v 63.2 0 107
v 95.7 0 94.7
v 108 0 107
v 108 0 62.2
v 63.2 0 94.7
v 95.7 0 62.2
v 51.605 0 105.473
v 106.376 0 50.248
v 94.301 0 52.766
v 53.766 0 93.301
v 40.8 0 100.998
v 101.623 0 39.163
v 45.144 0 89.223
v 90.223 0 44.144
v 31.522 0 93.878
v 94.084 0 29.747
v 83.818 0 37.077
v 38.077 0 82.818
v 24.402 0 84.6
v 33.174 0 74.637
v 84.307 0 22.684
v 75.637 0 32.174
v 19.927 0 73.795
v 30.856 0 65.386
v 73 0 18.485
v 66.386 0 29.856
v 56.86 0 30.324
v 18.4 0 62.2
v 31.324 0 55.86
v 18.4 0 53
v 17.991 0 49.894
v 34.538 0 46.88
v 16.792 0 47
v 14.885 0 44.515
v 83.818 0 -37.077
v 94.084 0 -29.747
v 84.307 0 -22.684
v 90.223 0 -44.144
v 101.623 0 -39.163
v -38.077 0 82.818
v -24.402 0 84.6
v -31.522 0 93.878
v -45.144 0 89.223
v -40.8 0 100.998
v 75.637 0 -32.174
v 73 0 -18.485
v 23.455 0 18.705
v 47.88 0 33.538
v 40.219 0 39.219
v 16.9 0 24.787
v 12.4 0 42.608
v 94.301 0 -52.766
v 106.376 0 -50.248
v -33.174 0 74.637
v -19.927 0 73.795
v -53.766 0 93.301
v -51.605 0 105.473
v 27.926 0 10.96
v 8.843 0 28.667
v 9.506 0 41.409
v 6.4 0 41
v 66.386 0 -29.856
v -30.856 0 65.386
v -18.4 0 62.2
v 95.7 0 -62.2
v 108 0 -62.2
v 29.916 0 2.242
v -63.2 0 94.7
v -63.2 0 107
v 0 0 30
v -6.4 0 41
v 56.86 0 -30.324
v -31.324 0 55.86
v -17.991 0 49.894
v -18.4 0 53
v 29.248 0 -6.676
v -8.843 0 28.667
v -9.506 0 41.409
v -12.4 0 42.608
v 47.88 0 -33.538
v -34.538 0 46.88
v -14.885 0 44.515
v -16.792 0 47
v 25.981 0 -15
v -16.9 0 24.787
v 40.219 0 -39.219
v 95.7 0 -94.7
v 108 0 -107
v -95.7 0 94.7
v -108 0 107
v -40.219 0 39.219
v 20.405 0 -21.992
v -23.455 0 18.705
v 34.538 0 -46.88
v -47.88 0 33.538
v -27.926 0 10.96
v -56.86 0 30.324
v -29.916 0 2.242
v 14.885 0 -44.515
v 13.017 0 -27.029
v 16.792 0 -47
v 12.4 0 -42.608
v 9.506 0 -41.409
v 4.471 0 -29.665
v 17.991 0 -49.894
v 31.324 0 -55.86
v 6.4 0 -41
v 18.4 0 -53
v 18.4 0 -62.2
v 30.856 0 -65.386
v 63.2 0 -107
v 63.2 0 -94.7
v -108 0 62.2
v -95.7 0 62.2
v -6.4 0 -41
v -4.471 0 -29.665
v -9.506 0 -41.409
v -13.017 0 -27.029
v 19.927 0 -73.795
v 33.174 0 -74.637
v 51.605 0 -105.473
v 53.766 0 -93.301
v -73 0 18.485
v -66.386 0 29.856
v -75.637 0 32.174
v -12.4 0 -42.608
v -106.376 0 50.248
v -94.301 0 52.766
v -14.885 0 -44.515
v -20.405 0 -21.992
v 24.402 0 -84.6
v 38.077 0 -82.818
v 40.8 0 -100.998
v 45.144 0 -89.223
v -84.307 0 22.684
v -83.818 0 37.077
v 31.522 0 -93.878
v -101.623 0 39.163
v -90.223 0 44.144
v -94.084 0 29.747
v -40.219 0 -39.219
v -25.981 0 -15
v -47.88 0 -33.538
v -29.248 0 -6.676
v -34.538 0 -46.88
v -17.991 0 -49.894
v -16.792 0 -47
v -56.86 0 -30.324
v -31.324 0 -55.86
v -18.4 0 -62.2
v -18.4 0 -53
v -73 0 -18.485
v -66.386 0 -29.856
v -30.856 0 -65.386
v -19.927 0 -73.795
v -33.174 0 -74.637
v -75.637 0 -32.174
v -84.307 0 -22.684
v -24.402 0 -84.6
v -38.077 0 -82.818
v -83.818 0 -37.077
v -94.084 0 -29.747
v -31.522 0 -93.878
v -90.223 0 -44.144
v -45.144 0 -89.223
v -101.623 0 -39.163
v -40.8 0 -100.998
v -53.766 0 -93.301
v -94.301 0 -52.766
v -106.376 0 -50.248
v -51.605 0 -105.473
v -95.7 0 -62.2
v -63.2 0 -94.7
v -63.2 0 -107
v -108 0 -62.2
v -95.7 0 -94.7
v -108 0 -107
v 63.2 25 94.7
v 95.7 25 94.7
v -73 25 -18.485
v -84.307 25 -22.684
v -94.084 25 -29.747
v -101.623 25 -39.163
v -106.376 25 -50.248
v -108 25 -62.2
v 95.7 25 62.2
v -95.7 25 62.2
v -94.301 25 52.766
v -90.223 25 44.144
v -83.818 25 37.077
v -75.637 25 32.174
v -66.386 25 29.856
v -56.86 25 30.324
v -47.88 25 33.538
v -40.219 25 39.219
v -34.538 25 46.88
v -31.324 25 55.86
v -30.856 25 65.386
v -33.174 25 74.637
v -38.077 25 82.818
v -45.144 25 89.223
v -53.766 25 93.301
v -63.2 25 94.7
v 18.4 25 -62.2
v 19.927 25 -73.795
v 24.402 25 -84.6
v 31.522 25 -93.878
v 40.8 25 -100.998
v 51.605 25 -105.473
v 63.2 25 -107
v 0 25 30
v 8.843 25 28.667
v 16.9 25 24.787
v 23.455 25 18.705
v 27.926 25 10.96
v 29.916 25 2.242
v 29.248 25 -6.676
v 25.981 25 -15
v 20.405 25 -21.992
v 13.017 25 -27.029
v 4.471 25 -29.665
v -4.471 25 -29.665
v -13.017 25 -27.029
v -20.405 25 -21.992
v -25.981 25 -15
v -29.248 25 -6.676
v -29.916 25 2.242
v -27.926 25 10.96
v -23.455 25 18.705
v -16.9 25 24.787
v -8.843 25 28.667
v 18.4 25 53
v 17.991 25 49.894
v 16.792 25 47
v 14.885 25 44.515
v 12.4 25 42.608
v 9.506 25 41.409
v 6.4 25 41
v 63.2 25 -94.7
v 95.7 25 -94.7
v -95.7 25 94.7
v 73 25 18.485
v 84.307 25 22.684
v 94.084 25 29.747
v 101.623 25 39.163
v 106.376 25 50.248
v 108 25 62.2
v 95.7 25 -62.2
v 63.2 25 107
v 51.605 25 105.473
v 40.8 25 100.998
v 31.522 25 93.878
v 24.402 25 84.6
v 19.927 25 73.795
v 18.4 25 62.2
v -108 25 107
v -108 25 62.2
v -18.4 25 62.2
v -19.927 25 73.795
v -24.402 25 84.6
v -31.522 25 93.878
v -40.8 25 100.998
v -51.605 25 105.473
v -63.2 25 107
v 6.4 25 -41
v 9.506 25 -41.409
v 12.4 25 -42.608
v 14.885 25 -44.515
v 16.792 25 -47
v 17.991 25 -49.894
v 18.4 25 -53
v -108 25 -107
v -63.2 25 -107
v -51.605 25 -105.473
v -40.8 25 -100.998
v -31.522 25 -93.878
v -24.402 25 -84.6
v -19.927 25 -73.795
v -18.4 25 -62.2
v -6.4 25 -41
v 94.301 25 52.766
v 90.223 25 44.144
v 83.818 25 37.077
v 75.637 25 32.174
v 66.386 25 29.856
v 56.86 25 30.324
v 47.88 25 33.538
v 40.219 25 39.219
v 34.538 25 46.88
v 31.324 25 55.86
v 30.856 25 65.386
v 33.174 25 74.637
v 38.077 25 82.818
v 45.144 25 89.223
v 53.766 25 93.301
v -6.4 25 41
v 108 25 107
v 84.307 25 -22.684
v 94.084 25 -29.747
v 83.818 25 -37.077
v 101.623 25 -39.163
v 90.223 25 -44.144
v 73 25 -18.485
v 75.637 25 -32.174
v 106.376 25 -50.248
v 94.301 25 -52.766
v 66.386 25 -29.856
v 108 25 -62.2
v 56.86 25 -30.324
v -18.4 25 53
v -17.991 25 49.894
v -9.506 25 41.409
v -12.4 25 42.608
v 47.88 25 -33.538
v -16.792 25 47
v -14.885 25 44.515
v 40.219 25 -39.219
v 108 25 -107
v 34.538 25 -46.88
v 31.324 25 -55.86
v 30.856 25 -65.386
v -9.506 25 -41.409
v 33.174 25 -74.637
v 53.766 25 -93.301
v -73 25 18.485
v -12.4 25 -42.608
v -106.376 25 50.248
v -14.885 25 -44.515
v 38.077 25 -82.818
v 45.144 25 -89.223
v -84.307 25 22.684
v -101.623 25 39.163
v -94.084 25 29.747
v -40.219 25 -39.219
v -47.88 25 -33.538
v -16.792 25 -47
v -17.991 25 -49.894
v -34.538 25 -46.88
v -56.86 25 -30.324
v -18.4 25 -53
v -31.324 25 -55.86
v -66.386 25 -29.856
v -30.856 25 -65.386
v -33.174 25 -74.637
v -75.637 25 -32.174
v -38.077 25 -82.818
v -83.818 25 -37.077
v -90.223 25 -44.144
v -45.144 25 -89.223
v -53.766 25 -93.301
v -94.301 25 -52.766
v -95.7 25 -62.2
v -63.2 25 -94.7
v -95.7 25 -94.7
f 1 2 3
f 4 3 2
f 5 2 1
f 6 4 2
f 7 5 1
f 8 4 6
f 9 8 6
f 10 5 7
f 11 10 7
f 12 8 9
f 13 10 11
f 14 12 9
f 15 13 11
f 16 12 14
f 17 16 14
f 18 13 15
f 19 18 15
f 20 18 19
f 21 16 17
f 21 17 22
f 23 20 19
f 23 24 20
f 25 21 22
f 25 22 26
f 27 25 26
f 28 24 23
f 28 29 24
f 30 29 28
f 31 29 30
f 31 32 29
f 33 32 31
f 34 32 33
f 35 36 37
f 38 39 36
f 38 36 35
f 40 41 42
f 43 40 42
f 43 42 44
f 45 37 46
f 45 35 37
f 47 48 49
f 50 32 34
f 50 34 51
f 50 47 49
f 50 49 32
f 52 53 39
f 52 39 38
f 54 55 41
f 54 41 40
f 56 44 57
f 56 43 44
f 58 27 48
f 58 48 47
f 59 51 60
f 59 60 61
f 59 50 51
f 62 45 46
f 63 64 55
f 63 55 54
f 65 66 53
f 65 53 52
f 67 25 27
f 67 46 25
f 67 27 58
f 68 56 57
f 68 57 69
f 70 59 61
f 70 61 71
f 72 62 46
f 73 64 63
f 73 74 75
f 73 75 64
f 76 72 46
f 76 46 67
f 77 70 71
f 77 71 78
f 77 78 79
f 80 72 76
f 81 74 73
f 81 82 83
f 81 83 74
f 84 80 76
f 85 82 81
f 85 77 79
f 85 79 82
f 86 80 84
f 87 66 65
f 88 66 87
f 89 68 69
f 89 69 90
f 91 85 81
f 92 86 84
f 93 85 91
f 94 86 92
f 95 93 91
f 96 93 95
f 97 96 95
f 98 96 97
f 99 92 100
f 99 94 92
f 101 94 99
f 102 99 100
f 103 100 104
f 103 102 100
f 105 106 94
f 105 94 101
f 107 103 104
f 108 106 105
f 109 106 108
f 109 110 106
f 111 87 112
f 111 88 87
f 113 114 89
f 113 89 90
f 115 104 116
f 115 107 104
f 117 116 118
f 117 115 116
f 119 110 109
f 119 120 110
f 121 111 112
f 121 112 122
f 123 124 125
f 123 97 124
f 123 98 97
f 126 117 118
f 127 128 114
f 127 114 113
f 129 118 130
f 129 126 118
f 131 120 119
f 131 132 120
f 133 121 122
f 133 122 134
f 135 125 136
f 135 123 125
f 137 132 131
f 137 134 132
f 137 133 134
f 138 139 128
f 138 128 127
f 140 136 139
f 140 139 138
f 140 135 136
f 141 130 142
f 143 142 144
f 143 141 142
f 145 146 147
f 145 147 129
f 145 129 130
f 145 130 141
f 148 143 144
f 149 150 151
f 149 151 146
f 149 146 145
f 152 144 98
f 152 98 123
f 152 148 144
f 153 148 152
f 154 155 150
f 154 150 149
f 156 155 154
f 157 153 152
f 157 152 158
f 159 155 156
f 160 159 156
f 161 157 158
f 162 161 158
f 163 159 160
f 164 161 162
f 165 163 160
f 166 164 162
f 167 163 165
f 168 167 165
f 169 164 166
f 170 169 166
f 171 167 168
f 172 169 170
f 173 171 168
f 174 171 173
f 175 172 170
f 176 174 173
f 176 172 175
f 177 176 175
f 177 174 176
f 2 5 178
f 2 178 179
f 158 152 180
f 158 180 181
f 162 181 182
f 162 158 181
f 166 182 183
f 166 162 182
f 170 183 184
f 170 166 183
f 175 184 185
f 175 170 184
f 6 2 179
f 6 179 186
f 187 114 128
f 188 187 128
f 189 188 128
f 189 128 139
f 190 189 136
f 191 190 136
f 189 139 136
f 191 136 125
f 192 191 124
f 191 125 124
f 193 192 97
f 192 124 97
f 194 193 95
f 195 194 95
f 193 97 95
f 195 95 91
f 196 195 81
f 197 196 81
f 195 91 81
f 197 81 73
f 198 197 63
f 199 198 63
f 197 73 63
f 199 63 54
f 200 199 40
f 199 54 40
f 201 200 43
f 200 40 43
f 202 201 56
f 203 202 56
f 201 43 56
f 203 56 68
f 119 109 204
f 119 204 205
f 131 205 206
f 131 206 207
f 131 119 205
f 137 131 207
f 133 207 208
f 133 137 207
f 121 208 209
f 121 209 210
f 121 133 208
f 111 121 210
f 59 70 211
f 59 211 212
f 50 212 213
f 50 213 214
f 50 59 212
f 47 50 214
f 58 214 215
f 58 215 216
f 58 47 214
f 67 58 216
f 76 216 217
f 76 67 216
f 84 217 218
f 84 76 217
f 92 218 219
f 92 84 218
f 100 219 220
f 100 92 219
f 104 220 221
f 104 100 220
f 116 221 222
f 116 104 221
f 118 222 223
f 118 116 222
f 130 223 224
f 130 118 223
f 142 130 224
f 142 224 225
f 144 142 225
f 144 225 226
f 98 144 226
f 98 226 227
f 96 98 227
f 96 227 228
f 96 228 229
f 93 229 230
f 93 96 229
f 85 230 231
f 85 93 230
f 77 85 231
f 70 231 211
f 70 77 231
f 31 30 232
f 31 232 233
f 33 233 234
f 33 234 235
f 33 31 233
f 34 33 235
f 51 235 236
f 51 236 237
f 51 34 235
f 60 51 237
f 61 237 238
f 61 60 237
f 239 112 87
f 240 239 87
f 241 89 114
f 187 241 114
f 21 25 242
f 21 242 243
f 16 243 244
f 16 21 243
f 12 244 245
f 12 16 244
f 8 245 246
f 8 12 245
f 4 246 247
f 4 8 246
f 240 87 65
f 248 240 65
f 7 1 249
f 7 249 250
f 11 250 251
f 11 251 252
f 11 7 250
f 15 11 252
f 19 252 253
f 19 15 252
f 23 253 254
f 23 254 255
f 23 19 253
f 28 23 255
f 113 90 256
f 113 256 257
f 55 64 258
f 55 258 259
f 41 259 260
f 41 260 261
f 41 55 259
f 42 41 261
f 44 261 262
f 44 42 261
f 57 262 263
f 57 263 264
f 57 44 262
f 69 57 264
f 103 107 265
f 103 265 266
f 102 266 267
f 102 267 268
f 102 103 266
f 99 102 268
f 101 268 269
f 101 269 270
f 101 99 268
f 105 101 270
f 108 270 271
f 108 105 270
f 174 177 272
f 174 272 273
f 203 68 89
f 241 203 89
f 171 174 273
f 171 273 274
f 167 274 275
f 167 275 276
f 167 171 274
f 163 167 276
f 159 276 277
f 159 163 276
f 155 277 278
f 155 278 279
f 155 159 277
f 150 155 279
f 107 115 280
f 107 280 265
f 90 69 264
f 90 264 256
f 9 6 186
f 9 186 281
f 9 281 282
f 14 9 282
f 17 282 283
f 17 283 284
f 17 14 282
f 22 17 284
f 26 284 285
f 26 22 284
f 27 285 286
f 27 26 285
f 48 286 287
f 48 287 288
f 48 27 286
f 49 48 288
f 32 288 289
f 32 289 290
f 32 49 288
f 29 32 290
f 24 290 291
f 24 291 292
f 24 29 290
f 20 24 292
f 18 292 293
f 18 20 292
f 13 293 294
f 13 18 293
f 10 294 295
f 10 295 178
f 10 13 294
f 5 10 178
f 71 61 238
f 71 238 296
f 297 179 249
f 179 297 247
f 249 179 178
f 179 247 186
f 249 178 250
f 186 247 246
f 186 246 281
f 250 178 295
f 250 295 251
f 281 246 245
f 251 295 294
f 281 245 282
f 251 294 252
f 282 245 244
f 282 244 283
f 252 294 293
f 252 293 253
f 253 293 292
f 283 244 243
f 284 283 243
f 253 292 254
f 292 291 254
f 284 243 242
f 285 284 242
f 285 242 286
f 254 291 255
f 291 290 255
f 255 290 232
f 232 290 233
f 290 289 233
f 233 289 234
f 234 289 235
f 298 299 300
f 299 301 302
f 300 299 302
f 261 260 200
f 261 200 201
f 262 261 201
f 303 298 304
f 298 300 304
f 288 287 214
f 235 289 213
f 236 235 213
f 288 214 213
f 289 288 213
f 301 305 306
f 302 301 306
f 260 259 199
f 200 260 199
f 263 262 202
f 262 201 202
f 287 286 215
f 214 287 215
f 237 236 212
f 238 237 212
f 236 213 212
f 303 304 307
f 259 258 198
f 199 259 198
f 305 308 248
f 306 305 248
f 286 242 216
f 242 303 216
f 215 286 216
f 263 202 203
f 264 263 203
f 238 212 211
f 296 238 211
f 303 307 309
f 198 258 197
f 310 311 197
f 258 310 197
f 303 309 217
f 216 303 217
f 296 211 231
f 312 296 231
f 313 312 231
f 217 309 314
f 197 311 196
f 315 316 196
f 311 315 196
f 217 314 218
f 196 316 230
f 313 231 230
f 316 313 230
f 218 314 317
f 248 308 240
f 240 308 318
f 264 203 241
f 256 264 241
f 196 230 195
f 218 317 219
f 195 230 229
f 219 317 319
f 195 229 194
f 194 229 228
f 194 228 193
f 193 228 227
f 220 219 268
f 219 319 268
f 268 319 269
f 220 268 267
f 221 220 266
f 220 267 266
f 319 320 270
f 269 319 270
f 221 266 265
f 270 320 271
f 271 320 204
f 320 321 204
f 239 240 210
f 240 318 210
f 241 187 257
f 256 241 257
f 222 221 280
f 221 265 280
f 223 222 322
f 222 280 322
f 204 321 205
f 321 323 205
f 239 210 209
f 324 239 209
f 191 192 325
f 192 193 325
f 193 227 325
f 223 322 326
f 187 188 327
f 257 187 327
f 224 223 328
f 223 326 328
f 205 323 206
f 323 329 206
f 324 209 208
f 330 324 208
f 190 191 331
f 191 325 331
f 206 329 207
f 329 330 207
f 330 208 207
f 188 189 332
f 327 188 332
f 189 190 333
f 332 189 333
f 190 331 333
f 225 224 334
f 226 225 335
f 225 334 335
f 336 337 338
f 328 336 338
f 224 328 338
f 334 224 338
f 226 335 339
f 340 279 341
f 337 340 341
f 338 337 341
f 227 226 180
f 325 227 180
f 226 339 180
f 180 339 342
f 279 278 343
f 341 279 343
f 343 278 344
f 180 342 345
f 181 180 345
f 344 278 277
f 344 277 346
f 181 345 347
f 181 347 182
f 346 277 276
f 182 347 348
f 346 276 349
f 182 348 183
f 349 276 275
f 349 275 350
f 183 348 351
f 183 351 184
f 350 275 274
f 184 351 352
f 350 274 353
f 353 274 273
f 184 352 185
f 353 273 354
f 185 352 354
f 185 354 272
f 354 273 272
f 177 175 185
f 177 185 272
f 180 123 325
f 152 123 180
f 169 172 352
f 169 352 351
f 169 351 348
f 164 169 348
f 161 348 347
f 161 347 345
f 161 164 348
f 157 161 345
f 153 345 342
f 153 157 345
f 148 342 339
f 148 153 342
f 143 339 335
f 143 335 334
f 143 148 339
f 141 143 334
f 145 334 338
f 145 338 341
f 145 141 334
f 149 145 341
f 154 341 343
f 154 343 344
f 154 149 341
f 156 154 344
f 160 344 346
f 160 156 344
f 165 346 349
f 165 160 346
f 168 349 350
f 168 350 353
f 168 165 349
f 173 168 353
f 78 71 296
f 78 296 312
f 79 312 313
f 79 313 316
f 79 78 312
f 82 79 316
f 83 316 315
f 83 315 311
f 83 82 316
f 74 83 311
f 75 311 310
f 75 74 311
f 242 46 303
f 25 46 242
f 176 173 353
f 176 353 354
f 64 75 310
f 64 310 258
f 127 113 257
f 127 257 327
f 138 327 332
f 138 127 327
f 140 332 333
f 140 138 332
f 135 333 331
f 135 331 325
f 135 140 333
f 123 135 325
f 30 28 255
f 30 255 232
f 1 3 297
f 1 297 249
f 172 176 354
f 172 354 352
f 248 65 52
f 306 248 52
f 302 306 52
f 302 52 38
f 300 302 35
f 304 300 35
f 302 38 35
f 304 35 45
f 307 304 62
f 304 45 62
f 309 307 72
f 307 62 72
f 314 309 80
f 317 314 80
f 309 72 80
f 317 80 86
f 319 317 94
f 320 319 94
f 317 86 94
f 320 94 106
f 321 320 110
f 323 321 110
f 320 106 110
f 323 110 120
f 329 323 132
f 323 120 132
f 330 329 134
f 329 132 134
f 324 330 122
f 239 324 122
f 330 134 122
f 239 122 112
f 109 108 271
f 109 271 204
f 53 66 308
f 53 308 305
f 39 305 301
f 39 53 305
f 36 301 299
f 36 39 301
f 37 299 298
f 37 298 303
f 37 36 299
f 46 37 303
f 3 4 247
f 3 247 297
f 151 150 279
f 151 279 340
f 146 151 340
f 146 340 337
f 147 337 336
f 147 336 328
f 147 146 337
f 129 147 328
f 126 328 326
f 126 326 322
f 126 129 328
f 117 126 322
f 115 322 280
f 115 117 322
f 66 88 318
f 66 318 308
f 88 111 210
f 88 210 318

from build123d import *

# Parameters (mm, degrees)
SKETCH1_R           = 30
BOSS_EXTRUDE1_DEPTH = 25


with BuildPart() as part:
    # Sketch1 → Boss-Extrude1 (new body)
    with BuildSketch(Plane(origin=(0, 0, 0), x_dir=(1, 0, 0), z_dir=(0, 1, 0))):
        with BuildLine():
            Line((-108, 107), (-63.2, 107))
            ThreePointArc((-63.2, 107), (-31.521616203, 93.878383797), (-18.4, 62.2))
            Line((-18.4, 62.2), (-18.4, 53))
            ThreePointArc((-18.4, 53), (-14.885281374, 44.514718626), (-6.4, 41))
            Line((-6.4, 41), (0, 41))
            Line((0, 41), (6.4, 41))
            ThreePointArc((6.4, 41), (14.885281374, 44.514718626), (18.4, 53))
            Line((18.4, 53), (18.4, 62.2))
            ThreePointArc((18.4, 62.2), (31.521616203, 93.878383797), (63.2, 107))
            Line((63.2, 107), (108, 107))
            Line((108, 107), (108, 62.2))
            ThreePointArc((108, 62.2), (98.171988791, 34.2), (73, 18.485014011))
            Line((73, 18.485014011), (73, -18.485014011))
            ThreePointArc((73, -18.485014011), (98.171988791, -34.2), (108, -62.2))
            Line((108, -62.2), (108, -107))
            Line((108, -107), (63.2, -107))
            ThreePointArc((63.2, -107), (31.521616203, -93.878383797), (18.4, -62.2))
            Line((18.4, -62.2), (18.4, -53))
            ThreePointArc((18.4, -53), (14.885281374, -44.514718626), (6.4, -41))
            Line((6.4, -41), (0, -41))
            Line((0, -41), (-6.4, -41))
            ThreePointArc((-6.4, -41), (-14.885281374, -44.514718626), (-18.4, -53))
            Line((-18.4, -53), (-18.4, -62.2))
            ThreePointArc((-18.4, -62.2), (-31.521616203, -93.878383797), (-63.2, -107))
            Line((-63.2, -107), (-108, -107))
            Line((-108, -107), (-108, -62.2))
            ThreePointArc((-108, -62.2), (-98.171988791, -34.2), (-73, -18.485014011))
            Line((-73, -18.485014011), (-73, 18.485014011))
            ThreePointArc((-73, 18.485014011), (-98.171988791, 34.2), (-108, 62.2))
            Line((-108, 62.2), (-108, 107))
        make_face()
        with Locations(Location((0, 0, 0), (0, 0, 270))):
            Circle(SKETCH1_R, mode=Mode.SUBTRACT)
        with BuildLine():
            Line((-63.2, 94.7), (-95.7, 94.7))
            Line((-95.7, 94.7), (-95.7, 62.2))
            ThreePointArc((-95.7, 62.2), (-40.219029611, 39.219029611), (-63.2, 94.7))
        make_face(mode=Mode.SUBTRACT)
        with BuildLine():
            Line((-63.2, -94.7), (-95.7, -94.7))
            Line((-95.7, -94.7), (-95.7, -62.2))
            ThreePointArc((-95.7, -62.2), (-40.219029611, -39.219029611), (-63.2, -94.7))
        make_face(mode=Mode.SUBTRACT)
        with BuildLine():
            Line((63.2, -94.7), (95.7, -94.7))
            Line((95.7, -94.7), (95.7, -62.2))
            ThreePointArc((95.7, -62.2), (40.219029611, -39.219029611), (63.2, -94.7))
        make_face(mode=Mode.SUBTRACT)
        with BuildLine():
            Line((63.2, 94.7), (95.7, 94.7))
            Line((95.7, 94.7), (95.7, 62.2))
            ThreePointArc((95.7, 62.2), (40.219029611, 39.219029611), (63.2, 94.7))
        make_face(mode=Mode.SUBTRACT)
    extrude(amount=BOSS_EXTRUDE1_DEPTH)


solid = part.part
